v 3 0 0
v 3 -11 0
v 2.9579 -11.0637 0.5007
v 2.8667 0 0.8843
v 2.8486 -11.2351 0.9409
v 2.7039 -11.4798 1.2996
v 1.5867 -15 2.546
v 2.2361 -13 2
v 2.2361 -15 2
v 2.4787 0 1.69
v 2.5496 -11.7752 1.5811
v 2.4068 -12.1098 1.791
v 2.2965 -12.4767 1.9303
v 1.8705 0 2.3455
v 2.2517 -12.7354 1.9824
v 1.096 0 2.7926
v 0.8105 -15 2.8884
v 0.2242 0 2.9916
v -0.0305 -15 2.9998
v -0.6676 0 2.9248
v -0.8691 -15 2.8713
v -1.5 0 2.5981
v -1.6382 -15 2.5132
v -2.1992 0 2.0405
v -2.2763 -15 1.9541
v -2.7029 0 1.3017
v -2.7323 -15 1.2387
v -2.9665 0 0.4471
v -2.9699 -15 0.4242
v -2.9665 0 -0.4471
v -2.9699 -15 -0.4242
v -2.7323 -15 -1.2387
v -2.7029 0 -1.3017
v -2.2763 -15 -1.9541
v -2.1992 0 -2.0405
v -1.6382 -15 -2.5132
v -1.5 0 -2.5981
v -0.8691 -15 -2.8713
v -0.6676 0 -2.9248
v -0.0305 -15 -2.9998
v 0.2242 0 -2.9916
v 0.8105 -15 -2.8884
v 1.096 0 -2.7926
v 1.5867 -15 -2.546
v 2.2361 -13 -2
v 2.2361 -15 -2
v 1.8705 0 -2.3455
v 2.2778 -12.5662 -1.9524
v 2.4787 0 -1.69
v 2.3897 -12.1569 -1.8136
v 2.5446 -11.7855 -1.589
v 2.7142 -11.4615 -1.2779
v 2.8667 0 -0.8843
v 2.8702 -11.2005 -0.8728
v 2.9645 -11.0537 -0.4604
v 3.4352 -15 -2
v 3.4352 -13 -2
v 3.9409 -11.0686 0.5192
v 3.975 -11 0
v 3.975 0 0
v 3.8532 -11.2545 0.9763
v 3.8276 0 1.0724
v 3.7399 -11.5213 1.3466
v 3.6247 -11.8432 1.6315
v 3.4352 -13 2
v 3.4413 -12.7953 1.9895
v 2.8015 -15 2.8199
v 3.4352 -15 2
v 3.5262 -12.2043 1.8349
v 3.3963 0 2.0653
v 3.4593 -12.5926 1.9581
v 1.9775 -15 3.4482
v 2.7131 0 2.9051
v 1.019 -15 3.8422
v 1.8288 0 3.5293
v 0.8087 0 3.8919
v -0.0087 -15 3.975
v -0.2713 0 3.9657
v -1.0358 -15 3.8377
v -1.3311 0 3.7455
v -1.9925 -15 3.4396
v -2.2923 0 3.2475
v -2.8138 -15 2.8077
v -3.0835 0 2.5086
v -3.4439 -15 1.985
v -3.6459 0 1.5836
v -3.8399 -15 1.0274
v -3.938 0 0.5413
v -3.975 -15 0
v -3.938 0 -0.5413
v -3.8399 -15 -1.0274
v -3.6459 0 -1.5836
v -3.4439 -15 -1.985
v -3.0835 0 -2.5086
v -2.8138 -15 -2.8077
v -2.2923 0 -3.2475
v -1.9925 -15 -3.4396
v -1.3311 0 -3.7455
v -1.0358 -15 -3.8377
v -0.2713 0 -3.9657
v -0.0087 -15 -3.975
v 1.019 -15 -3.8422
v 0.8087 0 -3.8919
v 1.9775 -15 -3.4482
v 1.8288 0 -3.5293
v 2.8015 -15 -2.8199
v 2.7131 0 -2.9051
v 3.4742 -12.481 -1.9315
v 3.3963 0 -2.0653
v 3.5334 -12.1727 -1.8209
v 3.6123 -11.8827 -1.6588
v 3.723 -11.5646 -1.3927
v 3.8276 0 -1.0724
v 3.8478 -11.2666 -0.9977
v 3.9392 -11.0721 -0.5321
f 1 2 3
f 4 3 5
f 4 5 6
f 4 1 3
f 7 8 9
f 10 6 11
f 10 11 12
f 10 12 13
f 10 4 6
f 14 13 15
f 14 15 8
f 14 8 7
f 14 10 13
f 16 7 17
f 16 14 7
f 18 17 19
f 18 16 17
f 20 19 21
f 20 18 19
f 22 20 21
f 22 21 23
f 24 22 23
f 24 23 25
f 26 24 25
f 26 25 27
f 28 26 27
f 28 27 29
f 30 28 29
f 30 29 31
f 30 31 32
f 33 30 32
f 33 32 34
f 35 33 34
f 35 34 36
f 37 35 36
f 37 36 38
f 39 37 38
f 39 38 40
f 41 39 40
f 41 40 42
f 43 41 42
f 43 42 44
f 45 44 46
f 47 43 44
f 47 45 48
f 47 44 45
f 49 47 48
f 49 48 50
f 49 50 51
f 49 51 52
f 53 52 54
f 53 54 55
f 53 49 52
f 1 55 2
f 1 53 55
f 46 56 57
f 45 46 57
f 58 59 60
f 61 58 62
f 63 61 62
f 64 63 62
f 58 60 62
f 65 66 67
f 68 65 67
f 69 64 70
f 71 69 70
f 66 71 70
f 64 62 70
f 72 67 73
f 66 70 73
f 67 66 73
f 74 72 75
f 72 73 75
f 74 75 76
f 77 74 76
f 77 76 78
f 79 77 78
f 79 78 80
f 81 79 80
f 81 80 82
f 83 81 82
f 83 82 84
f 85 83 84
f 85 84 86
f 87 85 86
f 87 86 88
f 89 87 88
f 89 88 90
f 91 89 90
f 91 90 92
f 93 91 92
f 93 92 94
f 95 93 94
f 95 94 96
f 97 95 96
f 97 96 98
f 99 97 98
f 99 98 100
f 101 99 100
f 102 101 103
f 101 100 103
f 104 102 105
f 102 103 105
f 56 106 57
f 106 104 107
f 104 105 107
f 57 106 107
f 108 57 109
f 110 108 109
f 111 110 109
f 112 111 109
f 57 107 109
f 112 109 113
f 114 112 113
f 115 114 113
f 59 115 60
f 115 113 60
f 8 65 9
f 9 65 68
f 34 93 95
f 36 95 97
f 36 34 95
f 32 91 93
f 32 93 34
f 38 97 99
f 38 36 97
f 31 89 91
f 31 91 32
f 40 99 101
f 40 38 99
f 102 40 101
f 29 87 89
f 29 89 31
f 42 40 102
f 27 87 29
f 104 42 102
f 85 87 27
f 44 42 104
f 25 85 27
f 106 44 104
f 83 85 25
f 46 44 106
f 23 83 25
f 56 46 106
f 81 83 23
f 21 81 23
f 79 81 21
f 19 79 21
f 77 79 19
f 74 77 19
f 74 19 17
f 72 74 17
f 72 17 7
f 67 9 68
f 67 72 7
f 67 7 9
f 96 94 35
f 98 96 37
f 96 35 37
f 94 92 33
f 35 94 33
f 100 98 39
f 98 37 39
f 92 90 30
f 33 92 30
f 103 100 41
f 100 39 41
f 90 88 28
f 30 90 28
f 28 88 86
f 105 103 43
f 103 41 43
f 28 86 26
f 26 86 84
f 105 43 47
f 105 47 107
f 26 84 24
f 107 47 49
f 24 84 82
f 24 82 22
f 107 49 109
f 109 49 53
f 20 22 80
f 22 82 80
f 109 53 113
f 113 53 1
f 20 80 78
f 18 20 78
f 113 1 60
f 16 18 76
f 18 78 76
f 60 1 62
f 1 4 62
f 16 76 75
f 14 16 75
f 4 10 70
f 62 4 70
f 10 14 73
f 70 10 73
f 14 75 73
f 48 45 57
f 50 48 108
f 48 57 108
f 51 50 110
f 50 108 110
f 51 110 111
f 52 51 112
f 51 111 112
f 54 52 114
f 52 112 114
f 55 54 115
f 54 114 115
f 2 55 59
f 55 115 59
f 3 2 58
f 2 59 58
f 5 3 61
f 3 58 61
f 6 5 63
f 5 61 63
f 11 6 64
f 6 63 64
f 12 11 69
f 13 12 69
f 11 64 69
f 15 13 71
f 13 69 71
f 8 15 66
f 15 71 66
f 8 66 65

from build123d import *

# Parameters (mm, degrees)
F0_R     = 3.975
F0_R_2   = 3
F1_DEPTH = 15
F4_DEPTH = 3


with BuildPart() as f1:
    # F0 (on Front) → F1 (new body)
    with BuildSketch(Plane.XZ):
        Circle(F0_R)
        Circle(F0_R_2, mode=Mode.SUBTRACT)
    extrude(amount=F1_DEPTH)

    # F3 (on offset) → F4 (cut)
    with BuildSketch(Plane.YZ.offset(3.975)):
        with BuildLine():
            Line((-15, 2), (-15, -2))
            Line((-15, -2), (-13, -2))
            ThreePointArc((-13, -2), (-11, 0), (-13, 2))
            Line((-13, 2), (-15, 2))
        make_face()
    extrude(amount=-F4_DEPTH, mode=Mode.SUBTRACT)


solid = f1.part
